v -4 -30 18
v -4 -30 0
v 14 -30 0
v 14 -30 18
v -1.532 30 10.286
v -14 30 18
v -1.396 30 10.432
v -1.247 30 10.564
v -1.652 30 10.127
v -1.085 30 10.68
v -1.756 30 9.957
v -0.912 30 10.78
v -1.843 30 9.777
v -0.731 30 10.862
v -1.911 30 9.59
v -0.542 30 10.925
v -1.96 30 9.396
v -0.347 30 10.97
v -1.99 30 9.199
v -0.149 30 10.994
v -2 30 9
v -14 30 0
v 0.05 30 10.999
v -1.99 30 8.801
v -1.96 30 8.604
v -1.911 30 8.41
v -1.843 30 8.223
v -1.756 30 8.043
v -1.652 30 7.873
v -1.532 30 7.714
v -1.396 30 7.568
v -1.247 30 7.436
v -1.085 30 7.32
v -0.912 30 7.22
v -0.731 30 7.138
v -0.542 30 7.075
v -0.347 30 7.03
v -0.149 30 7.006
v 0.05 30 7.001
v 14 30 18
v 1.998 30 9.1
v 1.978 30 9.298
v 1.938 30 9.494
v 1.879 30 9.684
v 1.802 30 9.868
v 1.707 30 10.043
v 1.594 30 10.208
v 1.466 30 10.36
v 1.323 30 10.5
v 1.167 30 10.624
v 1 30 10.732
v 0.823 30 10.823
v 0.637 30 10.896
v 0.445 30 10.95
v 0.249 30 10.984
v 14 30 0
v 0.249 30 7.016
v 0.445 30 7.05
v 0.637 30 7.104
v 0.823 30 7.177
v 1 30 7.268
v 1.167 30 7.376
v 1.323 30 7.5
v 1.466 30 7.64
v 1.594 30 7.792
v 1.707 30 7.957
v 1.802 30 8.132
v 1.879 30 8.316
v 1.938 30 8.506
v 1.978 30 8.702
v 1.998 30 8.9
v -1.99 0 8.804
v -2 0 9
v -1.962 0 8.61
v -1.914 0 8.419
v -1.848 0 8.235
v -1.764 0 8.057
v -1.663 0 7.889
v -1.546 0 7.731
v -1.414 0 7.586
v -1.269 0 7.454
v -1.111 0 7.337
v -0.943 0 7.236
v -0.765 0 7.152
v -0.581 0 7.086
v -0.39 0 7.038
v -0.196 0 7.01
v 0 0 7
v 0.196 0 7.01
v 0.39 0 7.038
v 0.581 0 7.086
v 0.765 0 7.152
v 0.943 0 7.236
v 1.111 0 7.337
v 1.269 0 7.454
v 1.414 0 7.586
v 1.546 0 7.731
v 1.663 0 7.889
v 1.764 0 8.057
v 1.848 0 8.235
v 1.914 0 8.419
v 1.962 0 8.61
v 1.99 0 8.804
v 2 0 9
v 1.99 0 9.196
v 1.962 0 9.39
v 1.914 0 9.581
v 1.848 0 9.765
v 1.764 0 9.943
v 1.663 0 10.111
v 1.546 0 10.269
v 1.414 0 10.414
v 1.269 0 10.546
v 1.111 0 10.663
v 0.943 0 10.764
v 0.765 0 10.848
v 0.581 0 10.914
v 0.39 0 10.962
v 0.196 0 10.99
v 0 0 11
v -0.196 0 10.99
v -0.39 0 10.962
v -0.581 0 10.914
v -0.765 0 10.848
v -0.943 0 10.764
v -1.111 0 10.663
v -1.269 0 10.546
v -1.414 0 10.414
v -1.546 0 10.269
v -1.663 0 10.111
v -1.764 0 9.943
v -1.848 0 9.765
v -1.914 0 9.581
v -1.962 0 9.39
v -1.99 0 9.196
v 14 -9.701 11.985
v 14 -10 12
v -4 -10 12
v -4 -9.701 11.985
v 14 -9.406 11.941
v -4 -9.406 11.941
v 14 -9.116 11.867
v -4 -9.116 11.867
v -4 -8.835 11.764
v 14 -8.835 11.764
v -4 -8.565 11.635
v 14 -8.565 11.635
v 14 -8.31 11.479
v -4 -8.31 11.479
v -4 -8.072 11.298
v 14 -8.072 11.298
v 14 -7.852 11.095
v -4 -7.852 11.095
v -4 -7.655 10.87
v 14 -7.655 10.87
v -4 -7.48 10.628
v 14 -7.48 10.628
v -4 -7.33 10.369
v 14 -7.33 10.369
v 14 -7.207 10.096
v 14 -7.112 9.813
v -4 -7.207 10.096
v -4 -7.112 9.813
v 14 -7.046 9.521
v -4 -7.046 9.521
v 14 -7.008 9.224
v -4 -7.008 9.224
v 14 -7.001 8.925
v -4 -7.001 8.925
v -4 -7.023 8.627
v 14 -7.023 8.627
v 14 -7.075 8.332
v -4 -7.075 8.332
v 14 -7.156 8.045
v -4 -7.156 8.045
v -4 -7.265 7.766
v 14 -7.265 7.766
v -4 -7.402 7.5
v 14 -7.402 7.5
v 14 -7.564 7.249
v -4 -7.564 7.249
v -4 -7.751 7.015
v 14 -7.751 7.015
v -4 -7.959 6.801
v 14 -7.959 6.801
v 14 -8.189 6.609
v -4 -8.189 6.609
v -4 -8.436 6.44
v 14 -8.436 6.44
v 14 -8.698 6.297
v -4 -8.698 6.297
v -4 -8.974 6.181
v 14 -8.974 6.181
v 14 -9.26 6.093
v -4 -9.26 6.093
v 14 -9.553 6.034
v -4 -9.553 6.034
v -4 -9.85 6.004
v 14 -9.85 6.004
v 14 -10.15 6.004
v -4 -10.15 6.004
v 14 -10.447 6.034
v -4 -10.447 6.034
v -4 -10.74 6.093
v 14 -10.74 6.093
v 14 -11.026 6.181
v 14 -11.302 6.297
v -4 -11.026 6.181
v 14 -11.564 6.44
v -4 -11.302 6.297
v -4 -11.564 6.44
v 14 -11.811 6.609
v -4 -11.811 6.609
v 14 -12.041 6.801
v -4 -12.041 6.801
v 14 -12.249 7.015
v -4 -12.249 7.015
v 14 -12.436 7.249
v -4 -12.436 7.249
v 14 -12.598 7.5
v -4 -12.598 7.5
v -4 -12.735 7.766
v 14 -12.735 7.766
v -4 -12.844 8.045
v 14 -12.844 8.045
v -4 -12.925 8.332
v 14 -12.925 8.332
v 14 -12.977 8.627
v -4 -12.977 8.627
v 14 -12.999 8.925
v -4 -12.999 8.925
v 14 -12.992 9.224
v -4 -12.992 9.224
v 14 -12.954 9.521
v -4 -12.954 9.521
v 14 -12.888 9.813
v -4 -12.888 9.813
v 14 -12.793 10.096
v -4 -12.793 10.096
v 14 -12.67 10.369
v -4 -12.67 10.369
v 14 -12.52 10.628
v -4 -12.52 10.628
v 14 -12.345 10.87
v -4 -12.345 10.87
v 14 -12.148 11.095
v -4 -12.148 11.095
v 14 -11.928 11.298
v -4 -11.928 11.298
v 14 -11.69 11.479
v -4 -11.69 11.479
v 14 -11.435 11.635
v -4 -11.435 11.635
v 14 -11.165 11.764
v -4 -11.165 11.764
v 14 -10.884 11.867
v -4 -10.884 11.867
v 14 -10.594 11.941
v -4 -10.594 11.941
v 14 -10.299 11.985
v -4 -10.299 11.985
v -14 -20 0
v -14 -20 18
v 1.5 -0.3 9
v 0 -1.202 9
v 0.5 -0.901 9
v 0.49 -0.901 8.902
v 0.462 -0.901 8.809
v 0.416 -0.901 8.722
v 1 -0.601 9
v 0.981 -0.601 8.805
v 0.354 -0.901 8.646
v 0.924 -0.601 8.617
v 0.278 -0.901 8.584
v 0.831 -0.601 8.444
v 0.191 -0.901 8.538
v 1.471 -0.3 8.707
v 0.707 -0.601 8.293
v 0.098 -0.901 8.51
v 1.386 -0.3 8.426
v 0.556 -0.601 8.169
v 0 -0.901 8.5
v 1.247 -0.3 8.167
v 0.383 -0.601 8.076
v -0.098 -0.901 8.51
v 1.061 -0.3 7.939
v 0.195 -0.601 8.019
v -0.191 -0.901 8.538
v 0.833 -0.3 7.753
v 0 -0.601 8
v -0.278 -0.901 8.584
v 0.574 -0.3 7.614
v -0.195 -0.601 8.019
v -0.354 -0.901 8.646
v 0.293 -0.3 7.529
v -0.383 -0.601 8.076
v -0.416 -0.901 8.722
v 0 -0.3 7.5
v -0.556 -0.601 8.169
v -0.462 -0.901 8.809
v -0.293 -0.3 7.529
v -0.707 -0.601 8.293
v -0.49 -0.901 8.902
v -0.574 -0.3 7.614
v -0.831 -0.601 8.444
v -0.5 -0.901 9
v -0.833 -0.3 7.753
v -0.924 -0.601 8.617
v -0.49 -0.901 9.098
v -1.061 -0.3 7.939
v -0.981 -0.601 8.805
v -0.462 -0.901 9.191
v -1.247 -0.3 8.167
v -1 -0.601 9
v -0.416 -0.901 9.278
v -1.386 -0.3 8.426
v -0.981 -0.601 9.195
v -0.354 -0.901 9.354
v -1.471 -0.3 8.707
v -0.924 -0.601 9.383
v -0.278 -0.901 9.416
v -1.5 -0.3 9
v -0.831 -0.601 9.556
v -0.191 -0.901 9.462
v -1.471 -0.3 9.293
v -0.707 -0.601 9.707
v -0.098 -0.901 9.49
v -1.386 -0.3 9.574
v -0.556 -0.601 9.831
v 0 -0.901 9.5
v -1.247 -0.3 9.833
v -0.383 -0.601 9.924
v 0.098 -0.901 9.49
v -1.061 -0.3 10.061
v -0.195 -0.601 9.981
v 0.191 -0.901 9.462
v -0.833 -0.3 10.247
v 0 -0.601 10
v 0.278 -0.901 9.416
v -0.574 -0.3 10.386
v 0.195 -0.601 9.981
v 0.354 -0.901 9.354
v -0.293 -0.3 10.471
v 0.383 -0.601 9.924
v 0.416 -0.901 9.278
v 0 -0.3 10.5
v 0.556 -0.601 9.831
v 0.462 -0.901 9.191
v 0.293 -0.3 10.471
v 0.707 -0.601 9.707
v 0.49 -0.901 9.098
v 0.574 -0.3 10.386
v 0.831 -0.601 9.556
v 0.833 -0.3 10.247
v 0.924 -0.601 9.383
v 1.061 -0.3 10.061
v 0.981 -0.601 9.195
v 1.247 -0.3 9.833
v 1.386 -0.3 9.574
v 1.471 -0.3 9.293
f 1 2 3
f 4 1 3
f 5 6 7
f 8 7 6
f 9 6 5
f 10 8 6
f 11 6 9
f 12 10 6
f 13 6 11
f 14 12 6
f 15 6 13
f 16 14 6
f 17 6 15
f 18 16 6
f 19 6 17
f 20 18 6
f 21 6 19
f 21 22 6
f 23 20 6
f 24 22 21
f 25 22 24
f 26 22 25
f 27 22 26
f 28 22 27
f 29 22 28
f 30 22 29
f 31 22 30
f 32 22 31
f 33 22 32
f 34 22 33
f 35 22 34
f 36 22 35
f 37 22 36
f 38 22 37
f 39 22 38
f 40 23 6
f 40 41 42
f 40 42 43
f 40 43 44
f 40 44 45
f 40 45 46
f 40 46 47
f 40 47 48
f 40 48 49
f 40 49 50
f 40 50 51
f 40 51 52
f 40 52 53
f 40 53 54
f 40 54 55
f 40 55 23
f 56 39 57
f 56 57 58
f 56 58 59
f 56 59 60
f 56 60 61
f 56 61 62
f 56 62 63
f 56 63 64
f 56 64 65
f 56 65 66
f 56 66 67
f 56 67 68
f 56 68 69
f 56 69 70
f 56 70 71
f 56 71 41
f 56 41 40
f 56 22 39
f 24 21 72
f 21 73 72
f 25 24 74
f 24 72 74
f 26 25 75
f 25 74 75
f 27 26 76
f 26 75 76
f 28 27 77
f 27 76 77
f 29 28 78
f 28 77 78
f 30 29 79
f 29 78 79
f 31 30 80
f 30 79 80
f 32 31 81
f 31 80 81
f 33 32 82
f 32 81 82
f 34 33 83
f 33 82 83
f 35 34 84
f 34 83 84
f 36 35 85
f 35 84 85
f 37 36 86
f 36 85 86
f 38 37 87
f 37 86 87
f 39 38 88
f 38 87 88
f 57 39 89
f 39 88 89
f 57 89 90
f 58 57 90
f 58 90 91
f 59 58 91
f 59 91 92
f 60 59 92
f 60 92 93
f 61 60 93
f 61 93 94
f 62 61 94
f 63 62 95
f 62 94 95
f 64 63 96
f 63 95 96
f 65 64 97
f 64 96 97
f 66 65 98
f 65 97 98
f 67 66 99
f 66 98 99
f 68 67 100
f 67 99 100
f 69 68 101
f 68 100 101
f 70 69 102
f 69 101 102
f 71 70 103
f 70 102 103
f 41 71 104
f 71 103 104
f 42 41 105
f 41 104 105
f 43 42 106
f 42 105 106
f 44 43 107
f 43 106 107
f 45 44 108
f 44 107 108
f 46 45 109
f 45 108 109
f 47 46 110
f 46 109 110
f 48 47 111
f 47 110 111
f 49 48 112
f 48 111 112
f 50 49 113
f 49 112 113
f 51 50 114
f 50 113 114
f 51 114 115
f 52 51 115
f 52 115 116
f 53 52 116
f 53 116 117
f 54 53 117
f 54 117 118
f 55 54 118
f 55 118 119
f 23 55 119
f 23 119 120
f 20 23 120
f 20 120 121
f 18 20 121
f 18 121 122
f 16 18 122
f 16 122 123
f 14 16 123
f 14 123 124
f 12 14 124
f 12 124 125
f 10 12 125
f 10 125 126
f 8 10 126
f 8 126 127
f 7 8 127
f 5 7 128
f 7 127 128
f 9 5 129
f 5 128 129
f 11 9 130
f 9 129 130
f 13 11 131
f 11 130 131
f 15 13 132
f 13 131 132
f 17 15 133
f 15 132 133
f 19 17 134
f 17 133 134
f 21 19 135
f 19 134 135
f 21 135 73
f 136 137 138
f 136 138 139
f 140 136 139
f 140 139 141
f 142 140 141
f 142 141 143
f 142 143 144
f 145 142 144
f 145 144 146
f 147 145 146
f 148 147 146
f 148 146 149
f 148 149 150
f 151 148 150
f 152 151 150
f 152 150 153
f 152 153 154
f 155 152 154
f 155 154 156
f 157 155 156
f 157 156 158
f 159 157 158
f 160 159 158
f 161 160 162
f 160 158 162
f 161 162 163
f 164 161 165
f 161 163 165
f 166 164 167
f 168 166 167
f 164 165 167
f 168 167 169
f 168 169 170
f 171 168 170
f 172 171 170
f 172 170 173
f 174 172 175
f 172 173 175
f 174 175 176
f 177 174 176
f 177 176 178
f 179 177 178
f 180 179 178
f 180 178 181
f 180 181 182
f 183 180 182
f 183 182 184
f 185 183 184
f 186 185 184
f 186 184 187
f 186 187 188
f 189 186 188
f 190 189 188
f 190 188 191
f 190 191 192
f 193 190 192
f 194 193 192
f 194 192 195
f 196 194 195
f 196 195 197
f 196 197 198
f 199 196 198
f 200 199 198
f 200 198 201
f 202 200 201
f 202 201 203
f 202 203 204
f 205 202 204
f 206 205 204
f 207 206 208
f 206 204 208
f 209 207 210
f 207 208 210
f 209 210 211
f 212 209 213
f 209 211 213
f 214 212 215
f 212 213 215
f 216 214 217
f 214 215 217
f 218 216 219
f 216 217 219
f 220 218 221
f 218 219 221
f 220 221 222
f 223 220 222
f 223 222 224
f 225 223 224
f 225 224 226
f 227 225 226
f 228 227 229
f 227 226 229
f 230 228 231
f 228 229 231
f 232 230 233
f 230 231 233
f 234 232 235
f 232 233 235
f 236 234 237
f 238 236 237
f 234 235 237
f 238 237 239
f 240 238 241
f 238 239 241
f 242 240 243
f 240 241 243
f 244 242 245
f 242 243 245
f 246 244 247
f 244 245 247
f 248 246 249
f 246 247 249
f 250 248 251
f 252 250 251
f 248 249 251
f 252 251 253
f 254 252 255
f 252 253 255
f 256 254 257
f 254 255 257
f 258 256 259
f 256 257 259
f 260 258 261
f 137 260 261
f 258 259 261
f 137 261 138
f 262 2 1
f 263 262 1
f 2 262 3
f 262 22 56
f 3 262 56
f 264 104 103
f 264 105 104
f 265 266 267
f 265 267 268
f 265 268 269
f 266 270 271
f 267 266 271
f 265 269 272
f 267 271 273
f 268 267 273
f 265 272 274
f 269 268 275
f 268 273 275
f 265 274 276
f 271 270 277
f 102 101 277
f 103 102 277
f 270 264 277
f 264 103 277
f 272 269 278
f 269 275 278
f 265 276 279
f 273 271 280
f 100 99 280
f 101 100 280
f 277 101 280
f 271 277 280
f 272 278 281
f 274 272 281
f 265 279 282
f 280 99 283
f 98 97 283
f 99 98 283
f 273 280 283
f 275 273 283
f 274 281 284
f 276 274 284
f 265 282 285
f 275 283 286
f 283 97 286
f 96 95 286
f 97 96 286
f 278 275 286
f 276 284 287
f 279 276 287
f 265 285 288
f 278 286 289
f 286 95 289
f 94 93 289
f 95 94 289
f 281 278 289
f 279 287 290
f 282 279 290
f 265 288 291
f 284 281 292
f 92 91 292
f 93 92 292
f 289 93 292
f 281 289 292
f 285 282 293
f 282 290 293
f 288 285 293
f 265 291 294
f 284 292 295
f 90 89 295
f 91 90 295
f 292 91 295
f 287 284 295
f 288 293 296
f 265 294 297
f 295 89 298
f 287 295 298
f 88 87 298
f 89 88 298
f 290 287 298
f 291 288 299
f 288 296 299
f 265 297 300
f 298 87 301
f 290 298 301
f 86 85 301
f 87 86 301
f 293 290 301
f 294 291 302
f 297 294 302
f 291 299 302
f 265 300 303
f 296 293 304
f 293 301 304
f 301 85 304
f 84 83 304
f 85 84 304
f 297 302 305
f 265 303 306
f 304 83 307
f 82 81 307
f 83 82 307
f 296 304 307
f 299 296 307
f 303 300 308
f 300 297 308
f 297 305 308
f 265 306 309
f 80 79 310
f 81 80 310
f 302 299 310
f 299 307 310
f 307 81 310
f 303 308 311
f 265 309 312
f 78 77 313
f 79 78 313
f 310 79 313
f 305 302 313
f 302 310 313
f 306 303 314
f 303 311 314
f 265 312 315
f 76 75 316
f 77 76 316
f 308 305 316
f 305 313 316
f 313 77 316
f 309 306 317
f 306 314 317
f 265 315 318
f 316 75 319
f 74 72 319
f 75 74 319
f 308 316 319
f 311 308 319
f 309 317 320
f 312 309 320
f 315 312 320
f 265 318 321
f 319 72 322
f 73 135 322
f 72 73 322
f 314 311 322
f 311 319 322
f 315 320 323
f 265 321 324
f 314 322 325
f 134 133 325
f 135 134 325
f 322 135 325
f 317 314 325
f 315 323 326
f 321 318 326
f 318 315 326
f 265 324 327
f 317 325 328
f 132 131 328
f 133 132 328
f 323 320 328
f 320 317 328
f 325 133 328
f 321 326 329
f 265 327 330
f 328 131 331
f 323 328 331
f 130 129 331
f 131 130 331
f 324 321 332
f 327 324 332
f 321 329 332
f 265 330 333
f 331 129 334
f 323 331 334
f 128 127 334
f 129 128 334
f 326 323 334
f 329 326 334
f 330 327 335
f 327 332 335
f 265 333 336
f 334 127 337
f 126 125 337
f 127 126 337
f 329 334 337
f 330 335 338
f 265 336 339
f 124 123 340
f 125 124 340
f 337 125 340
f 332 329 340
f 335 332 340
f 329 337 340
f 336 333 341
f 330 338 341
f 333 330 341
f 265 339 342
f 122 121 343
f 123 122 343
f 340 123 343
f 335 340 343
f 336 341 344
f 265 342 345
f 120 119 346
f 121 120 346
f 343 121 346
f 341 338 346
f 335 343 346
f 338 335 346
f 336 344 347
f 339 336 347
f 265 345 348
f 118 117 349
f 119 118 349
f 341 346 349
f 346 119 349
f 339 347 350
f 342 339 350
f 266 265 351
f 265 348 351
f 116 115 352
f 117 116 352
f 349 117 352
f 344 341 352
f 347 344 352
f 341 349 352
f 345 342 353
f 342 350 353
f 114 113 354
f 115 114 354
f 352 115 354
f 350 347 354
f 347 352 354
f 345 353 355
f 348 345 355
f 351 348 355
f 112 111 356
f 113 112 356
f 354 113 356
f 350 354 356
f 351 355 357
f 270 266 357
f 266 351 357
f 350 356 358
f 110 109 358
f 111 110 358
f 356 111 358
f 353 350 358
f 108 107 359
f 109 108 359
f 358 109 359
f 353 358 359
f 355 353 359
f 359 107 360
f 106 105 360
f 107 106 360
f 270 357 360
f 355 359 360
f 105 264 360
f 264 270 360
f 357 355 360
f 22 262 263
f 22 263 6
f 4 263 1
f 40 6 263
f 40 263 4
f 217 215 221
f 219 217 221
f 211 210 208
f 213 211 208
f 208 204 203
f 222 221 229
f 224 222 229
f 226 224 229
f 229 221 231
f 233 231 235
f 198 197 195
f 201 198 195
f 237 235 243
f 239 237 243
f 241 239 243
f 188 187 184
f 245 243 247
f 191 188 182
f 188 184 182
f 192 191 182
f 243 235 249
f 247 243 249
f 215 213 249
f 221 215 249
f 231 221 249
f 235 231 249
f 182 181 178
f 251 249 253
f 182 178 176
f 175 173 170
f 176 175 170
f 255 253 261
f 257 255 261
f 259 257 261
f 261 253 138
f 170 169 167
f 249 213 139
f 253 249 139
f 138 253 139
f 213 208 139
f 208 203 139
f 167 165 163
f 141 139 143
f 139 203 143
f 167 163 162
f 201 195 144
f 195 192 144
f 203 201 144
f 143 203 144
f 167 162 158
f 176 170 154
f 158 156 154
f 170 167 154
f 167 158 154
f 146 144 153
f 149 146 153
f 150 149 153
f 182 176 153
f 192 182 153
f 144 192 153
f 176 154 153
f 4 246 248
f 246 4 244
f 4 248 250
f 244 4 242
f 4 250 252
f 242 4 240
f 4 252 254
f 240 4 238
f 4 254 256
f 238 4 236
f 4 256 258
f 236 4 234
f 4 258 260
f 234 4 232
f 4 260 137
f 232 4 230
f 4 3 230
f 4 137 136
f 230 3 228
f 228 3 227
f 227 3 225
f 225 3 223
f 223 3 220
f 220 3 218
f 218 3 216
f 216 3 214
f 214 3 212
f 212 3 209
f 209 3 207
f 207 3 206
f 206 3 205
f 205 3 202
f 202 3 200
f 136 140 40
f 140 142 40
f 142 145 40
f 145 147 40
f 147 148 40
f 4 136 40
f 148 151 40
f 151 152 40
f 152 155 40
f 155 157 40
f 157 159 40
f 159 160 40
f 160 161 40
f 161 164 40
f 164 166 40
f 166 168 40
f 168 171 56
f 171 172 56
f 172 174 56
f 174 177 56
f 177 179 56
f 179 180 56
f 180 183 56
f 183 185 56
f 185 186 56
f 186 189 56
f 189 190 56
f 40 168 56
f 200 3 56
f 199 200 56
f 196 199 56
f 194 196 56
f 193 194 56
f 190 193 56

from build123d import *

# Parameters (mm, degrees)
SKETCH1_W                    = 28
SKETCH1_H                    = 60
BOSS_EXTRUDE1_DEPTH          = 18
CHAMFER1_SIZE                = 10
F_4_0_4_DIAMETER_HOLE1_D     = 4
F_4_0_4_DIAMETER_HOLE1_DEPTH = 30
F_4_0_4_DIAMETER_HOLE1_TIP   = 1.201721238
F_6_0_6_DIAMETER_HOLE2_D     = 6
F_6_0_6_DIAMETER_HOLE2_DEPTH = 18


with BuildPart() as part:
    # Sketch1 → Boss-Extrude1 (new body)
    with BuildSketch(Plane.XY):
        Rectangle(SKETCH1_W, SKETCH1_H)
    extrude(amount=BOSS_EXTRUDE1_DEPTH)

    # Chamfer1
    chamfer1_edges = [part.edges().sort_by_distance(p)[0] for p in [
        (-14, -30, 9),
    ]]
    chamfer(chamfer1_edges, length=CHAMFER1_SIZE)

    # Ø4.0 (4) Diameter Hole1
    with Locations(Plane(origin=(0, 30, 0), x_dir=(1, 0, 0), z_dir=(0, 1, 0))):
        with Locations((0, -9)):
            Hole(F_4_0_4_DIAMETER_HOLE1_D / 2, depth=F_4_0_4_DIAMETER_HOLE1_DEPTH)
            with Locations((0, 0, -(F_4_0_4_DIAMETER_HOLE1_DEPTH + F_4_0_4_DIAMETER_HOLE1_TIP / 2))):  # 118° drill point
                Cone(0, F_4_0_4_DIAMETER_HOLE1_D / 2, F_4_0_4_DIAMETER_HOLE1_TIP, mode=Mode.SUBTRACT)

    # Ø6.0 (6) Diameter Hole2
    with Locations(Plane(origin=(14, 0, 0), x_dir=(0, 0, -1), z_dir=(1, 0, 0))):
        with Locations((-9, -10)):
            Hole(F_6_0_6_DIAMETER_HOLE2_D / 2, depth=F_6_0_6_DIAMETER_HOLE2_DEPTH)


solid = part.part
